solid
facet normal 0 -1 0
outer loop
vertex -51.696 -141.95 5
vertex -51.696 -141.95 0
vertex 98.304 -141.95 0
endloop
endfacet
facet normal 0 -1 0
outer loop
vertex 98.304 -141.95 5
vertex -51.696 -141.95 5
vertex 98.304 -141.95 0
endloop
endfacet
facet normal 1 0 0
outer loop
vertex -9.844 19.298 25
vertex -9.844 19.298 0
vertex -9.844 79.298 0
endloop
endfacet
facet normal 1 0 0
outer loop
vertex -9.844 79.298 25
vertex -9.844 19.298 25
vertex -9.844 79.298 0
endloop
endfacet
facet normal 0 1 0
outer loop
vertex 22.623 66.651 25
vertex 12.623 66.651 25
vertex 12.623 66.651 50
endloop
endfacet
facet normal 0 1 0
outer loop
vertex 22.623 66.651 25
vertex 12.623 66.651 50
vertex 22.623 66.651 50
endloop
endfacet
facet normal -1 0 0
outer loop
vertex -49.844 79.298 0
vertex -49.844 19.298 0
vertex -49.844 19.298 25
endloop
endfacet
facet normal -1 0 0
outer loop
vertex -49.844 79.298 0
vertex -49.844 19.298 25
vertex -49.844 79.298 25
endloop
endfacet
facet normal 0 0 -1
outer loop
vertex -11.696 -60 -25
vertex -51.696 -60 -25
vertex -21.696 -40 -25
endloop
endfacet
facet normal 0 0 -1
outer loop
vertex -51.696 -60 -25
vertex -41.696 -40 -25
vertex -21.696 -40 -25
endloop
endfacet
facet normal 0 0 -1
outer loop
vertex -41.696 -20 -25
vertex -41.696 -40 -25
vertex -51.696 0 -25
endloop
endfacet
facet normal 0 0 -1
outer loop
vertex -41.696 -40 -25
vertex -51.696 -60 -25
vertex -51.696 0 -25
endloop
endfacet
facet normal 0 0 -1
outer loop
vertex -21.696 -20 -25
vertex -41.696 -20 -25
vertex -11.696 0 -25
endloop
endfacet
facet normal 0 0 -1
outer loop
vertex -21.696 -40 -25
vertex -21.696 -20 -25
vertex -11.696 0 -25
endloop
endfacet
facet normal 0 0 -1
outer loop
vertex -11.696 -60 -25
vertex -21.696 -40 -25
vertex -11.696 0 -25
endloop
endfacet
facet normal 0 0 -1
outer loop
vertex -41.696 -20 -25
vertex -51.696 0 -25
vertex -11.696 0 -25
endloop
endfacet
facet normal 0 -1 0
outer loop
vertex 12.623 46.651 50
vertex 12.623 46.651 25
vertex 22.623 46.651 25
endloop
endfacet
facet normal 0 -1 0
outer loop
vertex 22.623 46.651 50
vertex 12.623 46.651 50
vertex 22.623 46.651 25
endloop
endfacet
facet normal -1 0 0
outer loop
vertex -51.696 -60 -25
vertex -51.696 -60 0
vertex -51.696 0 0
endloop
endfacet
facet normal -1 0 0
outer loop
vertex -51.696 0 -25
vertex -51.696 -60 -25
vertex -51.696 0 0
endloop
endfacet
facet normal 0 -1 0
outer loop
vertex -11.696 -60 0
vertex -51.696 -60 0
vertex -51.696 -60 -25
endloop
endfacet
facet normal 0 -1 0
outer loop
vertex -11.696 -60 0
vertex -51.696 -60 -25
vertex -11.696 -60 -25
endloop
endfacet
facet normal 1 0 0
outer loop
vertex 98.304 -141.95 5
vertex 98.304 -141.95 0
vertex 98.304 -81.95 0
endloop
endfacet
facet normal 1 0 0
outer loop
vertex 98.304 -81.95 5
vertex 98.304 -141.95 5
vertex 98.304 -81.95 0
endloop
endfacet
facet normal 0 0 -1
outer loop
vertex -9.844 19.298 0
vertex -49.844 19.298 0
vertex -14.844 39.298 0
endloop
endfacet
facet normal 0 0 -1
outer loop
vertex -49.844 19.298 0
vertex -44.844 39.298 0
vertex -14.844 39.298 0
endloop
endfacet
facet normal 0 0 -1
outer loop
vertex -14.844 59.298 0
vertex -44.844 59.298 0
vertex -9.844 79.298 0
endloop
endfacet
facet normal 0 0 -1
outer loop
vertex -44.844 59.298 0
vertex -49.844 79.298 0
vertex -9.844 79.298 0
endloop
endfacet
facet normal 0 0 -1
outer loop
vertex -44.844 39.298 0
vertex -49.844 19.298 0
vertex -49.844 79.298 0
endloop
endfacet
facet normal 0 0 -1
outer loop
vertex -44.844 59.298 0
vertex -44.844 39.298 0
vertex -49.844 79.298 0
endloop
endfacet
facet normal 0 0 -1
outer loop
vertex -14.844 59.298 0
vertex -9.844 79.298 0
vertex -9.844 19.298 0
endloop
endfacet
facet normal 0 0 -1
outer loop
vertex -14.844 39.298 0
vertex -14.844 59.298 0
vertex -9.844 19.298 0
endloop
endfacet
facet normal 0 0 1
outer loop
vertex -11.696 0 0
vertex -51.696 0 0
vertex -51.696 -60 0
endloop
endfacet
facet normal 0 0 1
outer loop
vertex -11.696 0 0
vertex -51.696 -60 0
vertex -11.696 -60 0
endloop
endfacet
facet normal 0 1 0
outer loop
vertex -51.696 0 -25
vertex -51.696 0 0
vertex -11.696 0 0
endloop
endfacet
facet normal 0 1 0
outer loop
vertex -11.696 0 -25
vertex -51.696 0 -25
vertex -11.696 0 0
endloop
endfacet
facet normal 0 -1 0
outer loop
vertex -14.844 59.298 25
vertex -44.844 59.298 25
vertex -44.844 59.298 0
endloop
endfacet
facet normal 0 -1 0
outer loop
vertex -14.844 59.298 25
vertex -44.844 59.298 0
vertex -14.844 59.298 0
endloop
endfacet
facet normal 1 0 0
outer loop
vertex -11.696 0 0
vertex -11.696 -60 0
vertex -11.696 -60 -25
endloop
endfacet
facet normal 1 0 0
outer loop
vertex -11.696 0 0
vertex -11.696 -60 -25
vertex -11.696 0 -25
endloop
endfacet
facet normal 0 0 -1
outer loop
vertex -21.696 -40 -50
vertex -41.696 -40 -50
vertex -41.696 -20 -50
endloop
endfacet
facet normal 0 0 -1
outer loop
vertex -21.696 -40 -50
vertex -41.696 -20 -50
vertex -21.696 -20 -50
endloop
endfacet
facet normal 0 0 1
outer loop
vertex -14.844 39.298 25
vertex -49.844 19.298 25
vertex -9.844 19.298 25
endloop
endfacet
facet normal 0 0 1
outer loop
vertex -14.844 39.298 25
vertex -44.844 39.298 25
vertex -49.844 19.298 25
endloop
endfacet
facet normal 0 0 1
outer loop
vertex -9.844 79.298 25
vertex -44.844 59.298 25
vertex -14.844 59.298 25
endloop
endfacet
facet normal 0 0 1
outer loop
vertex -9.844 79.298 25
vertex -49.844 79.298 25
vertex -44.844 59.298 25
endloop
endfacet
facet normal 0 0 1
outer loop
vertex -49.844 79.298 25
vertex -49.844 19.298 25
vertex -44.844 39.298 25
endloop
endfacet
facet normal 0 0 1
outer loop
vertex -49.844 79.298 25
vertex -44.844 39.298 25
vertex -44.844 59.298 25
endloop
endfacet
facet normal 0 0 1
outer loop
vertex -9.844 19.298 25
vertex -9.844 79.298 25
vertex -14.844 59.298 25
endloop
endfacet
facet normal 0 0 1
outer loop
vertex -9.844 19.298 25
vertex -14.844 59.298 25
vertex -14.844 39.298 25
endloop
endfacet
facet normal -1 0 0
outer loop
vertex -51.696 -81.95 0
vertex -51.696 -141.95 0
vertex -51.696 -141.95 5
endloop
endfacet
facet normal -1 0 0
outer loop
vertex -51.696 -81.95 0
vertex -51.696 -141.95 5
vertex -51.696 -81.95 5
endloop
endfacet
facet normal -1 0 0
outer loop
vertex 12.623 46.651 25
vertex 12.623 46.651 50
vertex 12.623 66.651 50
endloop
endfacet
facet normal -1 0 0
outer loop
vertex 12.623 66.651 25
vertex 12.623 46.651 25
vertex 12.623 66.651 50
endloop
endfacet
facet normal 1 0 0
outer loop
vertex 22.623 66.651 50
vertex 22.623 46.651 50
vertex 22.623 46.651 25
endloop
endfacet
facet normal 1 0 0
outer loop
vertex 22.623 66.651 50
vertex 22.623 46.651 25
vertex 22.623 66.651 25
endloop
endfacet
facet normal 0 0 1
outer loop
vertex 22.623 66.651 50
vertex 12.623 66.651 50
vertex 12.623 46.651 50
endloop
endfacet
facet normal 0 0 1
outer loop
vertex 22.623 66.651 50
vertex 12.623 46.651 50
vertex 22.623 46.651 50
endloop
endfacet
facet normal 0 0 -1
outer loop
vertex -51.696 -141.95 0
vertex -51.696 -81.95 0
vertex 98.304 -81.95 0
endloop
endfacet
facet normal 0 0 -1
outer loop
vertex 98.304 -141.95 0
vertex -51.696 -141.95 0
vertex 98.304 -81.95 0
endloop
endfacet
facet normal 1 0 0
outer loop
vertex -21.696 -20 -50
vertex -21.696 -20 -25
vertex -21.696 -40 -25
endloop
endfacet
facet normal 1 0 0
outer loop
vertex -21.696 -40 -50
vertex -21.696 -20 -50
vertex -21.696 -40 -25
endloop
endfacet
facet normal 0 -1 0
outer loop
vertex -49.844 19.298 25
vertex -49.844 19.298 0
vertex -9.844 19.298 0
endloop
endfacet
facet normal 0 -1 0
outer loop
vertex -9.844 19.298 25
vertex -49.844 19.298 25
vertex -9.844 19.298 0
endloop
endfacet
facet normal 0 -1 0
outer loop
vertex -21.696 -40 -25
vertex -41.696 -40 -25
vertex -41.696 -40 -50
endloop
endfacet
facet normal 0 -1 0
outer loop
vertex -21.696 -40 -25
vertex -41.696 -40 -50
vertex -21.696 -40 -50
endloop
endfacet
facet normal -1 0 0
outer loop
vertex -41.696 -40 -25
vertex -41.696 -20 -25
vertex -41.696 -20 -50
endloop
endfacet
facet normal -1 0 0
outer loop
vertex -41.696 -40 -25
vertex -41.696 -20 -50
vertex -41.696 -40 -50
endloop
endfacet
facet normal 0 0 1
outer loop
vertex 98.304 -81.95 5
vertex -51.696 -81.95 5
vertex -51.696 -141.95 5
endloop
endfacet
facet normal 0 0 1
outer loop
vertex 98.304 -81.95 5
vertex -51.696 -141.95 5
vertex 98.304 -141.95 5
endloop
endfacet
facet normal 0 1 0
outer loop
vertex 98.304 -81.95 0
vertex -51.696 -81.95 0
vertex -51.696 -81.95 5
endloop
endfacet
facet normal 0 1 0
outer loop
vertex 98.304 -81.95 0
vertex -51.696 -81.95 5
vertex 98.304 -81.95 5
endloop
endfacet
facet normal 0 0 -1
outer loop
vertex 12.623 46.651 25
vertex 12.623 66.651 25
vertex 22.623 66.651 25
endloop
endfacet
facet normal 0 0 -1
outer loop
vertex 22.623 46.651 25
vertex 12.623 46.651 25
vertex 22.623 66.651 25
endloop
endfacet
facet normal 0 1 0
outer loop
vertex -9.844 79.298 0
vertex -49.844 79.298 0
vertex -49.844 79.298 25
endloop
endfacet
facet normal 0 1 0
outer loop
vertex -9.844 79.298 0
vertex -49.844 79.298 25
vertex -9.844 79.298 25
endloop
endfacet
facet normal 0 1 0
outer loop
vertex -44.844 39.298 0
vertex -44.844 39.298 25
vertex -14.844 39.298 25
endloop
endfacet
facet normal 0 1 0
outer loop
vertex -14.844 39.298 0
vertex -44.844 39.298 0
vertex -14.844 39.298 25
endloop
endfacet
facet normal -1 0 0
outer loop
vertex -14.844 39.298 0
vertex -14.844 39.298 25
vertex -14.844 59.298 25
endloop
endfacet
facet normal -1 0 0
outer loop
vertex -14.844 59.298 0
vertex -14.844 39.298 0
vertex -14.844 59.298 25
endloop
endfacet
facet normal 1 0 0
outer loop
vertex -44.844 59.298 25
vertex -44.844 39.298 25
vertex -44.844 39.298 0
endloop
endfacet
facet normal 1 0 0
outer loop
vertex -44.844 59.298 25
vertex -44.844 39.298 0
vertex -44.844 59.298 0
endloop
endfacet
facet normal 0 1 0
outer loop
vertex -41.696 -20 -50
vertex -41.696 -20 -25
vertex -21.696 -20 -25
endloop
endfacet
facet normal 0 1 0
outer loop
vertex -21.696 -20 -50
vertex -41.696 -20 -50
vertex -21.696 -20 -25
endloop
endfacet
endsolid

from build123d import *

# Parameters (mm, degrees)
F0_W     = 40
F0_H     = 60
F1_DEPTH = 25
F2_W     = 30
F2_H     = 20
F3_DEPTH = 25
F4_DEPTH = 25
F0_W_2   = 150
F5_DEPTH = 5
F7_W     = 20
F7_H     = 20
F8_DEPTH = 25
F2_W_2   = 10
F9_DEPTH = 25


# Not quite as in the source:
# - a feature names something its author has since deleted; it is built from what else it names


with BuildPart() as f1:
    # F0 (on Top) → F1 (new body)
    with BuildSketch(Plane.XY):
        with Locations((-29.8438598402, 49.2976413488)):
            Rectangle(F0_W, F0_H)
    extrude(amount=F1_DEPTH)

    # F2 (on face) → F3 (cut)
    with BuildSketch(Plane.XY.offset(25)):
        with Locations((-29.8438598402, 49.2976413488)):
            Rectangle(F2_W, F2_H)
    extrude(amount=-F3_DEPTH, mode=Mode.SUBTRACT)


with BuildPart() as f4:
    # F0 (on Top) → F4 (new body)
    with BuildSketch(Plane.XY):
        with Locations((-31.6961142421, -30)):
            Rectangle(F0_W, F0_H)
    extrude(amount=-F4_DEPTH)

    # F7 (on face) → F8 (join)
    with BuildSketch(Plane(origin=(0, 0, -25), x_dir=(1, 0, 0), z_dir=(0, 0, -1))):
        with Locations((-31.6961142421, 30)):
            Rectangle(F7_W, F7_H)
    extrude(amount=F8_DEPTH)


with BuildPart() as f5:
    # F0 (on Top) → F5 (new body)
    with BuildSketch(Plane.XY):
        with Locations((23.3038857579, -111.950333491)):
            Rectangle(F0_W_2, F0_H)
    extrude(amount=F5_DEPTH)


with BuildPart() as f9:
    # F2 (on face) → F9 (new body)
    with BuildSketch(Plane.XY.offset(25)):
        with Locations((17.6234441996, 56.6510467231)):
            Rectangle(F2_W_2, F2_H)
    extrude(amount=F9_DEPTH)


solid = Compound([f1.part, f4.part, f5.part, f9.part])
